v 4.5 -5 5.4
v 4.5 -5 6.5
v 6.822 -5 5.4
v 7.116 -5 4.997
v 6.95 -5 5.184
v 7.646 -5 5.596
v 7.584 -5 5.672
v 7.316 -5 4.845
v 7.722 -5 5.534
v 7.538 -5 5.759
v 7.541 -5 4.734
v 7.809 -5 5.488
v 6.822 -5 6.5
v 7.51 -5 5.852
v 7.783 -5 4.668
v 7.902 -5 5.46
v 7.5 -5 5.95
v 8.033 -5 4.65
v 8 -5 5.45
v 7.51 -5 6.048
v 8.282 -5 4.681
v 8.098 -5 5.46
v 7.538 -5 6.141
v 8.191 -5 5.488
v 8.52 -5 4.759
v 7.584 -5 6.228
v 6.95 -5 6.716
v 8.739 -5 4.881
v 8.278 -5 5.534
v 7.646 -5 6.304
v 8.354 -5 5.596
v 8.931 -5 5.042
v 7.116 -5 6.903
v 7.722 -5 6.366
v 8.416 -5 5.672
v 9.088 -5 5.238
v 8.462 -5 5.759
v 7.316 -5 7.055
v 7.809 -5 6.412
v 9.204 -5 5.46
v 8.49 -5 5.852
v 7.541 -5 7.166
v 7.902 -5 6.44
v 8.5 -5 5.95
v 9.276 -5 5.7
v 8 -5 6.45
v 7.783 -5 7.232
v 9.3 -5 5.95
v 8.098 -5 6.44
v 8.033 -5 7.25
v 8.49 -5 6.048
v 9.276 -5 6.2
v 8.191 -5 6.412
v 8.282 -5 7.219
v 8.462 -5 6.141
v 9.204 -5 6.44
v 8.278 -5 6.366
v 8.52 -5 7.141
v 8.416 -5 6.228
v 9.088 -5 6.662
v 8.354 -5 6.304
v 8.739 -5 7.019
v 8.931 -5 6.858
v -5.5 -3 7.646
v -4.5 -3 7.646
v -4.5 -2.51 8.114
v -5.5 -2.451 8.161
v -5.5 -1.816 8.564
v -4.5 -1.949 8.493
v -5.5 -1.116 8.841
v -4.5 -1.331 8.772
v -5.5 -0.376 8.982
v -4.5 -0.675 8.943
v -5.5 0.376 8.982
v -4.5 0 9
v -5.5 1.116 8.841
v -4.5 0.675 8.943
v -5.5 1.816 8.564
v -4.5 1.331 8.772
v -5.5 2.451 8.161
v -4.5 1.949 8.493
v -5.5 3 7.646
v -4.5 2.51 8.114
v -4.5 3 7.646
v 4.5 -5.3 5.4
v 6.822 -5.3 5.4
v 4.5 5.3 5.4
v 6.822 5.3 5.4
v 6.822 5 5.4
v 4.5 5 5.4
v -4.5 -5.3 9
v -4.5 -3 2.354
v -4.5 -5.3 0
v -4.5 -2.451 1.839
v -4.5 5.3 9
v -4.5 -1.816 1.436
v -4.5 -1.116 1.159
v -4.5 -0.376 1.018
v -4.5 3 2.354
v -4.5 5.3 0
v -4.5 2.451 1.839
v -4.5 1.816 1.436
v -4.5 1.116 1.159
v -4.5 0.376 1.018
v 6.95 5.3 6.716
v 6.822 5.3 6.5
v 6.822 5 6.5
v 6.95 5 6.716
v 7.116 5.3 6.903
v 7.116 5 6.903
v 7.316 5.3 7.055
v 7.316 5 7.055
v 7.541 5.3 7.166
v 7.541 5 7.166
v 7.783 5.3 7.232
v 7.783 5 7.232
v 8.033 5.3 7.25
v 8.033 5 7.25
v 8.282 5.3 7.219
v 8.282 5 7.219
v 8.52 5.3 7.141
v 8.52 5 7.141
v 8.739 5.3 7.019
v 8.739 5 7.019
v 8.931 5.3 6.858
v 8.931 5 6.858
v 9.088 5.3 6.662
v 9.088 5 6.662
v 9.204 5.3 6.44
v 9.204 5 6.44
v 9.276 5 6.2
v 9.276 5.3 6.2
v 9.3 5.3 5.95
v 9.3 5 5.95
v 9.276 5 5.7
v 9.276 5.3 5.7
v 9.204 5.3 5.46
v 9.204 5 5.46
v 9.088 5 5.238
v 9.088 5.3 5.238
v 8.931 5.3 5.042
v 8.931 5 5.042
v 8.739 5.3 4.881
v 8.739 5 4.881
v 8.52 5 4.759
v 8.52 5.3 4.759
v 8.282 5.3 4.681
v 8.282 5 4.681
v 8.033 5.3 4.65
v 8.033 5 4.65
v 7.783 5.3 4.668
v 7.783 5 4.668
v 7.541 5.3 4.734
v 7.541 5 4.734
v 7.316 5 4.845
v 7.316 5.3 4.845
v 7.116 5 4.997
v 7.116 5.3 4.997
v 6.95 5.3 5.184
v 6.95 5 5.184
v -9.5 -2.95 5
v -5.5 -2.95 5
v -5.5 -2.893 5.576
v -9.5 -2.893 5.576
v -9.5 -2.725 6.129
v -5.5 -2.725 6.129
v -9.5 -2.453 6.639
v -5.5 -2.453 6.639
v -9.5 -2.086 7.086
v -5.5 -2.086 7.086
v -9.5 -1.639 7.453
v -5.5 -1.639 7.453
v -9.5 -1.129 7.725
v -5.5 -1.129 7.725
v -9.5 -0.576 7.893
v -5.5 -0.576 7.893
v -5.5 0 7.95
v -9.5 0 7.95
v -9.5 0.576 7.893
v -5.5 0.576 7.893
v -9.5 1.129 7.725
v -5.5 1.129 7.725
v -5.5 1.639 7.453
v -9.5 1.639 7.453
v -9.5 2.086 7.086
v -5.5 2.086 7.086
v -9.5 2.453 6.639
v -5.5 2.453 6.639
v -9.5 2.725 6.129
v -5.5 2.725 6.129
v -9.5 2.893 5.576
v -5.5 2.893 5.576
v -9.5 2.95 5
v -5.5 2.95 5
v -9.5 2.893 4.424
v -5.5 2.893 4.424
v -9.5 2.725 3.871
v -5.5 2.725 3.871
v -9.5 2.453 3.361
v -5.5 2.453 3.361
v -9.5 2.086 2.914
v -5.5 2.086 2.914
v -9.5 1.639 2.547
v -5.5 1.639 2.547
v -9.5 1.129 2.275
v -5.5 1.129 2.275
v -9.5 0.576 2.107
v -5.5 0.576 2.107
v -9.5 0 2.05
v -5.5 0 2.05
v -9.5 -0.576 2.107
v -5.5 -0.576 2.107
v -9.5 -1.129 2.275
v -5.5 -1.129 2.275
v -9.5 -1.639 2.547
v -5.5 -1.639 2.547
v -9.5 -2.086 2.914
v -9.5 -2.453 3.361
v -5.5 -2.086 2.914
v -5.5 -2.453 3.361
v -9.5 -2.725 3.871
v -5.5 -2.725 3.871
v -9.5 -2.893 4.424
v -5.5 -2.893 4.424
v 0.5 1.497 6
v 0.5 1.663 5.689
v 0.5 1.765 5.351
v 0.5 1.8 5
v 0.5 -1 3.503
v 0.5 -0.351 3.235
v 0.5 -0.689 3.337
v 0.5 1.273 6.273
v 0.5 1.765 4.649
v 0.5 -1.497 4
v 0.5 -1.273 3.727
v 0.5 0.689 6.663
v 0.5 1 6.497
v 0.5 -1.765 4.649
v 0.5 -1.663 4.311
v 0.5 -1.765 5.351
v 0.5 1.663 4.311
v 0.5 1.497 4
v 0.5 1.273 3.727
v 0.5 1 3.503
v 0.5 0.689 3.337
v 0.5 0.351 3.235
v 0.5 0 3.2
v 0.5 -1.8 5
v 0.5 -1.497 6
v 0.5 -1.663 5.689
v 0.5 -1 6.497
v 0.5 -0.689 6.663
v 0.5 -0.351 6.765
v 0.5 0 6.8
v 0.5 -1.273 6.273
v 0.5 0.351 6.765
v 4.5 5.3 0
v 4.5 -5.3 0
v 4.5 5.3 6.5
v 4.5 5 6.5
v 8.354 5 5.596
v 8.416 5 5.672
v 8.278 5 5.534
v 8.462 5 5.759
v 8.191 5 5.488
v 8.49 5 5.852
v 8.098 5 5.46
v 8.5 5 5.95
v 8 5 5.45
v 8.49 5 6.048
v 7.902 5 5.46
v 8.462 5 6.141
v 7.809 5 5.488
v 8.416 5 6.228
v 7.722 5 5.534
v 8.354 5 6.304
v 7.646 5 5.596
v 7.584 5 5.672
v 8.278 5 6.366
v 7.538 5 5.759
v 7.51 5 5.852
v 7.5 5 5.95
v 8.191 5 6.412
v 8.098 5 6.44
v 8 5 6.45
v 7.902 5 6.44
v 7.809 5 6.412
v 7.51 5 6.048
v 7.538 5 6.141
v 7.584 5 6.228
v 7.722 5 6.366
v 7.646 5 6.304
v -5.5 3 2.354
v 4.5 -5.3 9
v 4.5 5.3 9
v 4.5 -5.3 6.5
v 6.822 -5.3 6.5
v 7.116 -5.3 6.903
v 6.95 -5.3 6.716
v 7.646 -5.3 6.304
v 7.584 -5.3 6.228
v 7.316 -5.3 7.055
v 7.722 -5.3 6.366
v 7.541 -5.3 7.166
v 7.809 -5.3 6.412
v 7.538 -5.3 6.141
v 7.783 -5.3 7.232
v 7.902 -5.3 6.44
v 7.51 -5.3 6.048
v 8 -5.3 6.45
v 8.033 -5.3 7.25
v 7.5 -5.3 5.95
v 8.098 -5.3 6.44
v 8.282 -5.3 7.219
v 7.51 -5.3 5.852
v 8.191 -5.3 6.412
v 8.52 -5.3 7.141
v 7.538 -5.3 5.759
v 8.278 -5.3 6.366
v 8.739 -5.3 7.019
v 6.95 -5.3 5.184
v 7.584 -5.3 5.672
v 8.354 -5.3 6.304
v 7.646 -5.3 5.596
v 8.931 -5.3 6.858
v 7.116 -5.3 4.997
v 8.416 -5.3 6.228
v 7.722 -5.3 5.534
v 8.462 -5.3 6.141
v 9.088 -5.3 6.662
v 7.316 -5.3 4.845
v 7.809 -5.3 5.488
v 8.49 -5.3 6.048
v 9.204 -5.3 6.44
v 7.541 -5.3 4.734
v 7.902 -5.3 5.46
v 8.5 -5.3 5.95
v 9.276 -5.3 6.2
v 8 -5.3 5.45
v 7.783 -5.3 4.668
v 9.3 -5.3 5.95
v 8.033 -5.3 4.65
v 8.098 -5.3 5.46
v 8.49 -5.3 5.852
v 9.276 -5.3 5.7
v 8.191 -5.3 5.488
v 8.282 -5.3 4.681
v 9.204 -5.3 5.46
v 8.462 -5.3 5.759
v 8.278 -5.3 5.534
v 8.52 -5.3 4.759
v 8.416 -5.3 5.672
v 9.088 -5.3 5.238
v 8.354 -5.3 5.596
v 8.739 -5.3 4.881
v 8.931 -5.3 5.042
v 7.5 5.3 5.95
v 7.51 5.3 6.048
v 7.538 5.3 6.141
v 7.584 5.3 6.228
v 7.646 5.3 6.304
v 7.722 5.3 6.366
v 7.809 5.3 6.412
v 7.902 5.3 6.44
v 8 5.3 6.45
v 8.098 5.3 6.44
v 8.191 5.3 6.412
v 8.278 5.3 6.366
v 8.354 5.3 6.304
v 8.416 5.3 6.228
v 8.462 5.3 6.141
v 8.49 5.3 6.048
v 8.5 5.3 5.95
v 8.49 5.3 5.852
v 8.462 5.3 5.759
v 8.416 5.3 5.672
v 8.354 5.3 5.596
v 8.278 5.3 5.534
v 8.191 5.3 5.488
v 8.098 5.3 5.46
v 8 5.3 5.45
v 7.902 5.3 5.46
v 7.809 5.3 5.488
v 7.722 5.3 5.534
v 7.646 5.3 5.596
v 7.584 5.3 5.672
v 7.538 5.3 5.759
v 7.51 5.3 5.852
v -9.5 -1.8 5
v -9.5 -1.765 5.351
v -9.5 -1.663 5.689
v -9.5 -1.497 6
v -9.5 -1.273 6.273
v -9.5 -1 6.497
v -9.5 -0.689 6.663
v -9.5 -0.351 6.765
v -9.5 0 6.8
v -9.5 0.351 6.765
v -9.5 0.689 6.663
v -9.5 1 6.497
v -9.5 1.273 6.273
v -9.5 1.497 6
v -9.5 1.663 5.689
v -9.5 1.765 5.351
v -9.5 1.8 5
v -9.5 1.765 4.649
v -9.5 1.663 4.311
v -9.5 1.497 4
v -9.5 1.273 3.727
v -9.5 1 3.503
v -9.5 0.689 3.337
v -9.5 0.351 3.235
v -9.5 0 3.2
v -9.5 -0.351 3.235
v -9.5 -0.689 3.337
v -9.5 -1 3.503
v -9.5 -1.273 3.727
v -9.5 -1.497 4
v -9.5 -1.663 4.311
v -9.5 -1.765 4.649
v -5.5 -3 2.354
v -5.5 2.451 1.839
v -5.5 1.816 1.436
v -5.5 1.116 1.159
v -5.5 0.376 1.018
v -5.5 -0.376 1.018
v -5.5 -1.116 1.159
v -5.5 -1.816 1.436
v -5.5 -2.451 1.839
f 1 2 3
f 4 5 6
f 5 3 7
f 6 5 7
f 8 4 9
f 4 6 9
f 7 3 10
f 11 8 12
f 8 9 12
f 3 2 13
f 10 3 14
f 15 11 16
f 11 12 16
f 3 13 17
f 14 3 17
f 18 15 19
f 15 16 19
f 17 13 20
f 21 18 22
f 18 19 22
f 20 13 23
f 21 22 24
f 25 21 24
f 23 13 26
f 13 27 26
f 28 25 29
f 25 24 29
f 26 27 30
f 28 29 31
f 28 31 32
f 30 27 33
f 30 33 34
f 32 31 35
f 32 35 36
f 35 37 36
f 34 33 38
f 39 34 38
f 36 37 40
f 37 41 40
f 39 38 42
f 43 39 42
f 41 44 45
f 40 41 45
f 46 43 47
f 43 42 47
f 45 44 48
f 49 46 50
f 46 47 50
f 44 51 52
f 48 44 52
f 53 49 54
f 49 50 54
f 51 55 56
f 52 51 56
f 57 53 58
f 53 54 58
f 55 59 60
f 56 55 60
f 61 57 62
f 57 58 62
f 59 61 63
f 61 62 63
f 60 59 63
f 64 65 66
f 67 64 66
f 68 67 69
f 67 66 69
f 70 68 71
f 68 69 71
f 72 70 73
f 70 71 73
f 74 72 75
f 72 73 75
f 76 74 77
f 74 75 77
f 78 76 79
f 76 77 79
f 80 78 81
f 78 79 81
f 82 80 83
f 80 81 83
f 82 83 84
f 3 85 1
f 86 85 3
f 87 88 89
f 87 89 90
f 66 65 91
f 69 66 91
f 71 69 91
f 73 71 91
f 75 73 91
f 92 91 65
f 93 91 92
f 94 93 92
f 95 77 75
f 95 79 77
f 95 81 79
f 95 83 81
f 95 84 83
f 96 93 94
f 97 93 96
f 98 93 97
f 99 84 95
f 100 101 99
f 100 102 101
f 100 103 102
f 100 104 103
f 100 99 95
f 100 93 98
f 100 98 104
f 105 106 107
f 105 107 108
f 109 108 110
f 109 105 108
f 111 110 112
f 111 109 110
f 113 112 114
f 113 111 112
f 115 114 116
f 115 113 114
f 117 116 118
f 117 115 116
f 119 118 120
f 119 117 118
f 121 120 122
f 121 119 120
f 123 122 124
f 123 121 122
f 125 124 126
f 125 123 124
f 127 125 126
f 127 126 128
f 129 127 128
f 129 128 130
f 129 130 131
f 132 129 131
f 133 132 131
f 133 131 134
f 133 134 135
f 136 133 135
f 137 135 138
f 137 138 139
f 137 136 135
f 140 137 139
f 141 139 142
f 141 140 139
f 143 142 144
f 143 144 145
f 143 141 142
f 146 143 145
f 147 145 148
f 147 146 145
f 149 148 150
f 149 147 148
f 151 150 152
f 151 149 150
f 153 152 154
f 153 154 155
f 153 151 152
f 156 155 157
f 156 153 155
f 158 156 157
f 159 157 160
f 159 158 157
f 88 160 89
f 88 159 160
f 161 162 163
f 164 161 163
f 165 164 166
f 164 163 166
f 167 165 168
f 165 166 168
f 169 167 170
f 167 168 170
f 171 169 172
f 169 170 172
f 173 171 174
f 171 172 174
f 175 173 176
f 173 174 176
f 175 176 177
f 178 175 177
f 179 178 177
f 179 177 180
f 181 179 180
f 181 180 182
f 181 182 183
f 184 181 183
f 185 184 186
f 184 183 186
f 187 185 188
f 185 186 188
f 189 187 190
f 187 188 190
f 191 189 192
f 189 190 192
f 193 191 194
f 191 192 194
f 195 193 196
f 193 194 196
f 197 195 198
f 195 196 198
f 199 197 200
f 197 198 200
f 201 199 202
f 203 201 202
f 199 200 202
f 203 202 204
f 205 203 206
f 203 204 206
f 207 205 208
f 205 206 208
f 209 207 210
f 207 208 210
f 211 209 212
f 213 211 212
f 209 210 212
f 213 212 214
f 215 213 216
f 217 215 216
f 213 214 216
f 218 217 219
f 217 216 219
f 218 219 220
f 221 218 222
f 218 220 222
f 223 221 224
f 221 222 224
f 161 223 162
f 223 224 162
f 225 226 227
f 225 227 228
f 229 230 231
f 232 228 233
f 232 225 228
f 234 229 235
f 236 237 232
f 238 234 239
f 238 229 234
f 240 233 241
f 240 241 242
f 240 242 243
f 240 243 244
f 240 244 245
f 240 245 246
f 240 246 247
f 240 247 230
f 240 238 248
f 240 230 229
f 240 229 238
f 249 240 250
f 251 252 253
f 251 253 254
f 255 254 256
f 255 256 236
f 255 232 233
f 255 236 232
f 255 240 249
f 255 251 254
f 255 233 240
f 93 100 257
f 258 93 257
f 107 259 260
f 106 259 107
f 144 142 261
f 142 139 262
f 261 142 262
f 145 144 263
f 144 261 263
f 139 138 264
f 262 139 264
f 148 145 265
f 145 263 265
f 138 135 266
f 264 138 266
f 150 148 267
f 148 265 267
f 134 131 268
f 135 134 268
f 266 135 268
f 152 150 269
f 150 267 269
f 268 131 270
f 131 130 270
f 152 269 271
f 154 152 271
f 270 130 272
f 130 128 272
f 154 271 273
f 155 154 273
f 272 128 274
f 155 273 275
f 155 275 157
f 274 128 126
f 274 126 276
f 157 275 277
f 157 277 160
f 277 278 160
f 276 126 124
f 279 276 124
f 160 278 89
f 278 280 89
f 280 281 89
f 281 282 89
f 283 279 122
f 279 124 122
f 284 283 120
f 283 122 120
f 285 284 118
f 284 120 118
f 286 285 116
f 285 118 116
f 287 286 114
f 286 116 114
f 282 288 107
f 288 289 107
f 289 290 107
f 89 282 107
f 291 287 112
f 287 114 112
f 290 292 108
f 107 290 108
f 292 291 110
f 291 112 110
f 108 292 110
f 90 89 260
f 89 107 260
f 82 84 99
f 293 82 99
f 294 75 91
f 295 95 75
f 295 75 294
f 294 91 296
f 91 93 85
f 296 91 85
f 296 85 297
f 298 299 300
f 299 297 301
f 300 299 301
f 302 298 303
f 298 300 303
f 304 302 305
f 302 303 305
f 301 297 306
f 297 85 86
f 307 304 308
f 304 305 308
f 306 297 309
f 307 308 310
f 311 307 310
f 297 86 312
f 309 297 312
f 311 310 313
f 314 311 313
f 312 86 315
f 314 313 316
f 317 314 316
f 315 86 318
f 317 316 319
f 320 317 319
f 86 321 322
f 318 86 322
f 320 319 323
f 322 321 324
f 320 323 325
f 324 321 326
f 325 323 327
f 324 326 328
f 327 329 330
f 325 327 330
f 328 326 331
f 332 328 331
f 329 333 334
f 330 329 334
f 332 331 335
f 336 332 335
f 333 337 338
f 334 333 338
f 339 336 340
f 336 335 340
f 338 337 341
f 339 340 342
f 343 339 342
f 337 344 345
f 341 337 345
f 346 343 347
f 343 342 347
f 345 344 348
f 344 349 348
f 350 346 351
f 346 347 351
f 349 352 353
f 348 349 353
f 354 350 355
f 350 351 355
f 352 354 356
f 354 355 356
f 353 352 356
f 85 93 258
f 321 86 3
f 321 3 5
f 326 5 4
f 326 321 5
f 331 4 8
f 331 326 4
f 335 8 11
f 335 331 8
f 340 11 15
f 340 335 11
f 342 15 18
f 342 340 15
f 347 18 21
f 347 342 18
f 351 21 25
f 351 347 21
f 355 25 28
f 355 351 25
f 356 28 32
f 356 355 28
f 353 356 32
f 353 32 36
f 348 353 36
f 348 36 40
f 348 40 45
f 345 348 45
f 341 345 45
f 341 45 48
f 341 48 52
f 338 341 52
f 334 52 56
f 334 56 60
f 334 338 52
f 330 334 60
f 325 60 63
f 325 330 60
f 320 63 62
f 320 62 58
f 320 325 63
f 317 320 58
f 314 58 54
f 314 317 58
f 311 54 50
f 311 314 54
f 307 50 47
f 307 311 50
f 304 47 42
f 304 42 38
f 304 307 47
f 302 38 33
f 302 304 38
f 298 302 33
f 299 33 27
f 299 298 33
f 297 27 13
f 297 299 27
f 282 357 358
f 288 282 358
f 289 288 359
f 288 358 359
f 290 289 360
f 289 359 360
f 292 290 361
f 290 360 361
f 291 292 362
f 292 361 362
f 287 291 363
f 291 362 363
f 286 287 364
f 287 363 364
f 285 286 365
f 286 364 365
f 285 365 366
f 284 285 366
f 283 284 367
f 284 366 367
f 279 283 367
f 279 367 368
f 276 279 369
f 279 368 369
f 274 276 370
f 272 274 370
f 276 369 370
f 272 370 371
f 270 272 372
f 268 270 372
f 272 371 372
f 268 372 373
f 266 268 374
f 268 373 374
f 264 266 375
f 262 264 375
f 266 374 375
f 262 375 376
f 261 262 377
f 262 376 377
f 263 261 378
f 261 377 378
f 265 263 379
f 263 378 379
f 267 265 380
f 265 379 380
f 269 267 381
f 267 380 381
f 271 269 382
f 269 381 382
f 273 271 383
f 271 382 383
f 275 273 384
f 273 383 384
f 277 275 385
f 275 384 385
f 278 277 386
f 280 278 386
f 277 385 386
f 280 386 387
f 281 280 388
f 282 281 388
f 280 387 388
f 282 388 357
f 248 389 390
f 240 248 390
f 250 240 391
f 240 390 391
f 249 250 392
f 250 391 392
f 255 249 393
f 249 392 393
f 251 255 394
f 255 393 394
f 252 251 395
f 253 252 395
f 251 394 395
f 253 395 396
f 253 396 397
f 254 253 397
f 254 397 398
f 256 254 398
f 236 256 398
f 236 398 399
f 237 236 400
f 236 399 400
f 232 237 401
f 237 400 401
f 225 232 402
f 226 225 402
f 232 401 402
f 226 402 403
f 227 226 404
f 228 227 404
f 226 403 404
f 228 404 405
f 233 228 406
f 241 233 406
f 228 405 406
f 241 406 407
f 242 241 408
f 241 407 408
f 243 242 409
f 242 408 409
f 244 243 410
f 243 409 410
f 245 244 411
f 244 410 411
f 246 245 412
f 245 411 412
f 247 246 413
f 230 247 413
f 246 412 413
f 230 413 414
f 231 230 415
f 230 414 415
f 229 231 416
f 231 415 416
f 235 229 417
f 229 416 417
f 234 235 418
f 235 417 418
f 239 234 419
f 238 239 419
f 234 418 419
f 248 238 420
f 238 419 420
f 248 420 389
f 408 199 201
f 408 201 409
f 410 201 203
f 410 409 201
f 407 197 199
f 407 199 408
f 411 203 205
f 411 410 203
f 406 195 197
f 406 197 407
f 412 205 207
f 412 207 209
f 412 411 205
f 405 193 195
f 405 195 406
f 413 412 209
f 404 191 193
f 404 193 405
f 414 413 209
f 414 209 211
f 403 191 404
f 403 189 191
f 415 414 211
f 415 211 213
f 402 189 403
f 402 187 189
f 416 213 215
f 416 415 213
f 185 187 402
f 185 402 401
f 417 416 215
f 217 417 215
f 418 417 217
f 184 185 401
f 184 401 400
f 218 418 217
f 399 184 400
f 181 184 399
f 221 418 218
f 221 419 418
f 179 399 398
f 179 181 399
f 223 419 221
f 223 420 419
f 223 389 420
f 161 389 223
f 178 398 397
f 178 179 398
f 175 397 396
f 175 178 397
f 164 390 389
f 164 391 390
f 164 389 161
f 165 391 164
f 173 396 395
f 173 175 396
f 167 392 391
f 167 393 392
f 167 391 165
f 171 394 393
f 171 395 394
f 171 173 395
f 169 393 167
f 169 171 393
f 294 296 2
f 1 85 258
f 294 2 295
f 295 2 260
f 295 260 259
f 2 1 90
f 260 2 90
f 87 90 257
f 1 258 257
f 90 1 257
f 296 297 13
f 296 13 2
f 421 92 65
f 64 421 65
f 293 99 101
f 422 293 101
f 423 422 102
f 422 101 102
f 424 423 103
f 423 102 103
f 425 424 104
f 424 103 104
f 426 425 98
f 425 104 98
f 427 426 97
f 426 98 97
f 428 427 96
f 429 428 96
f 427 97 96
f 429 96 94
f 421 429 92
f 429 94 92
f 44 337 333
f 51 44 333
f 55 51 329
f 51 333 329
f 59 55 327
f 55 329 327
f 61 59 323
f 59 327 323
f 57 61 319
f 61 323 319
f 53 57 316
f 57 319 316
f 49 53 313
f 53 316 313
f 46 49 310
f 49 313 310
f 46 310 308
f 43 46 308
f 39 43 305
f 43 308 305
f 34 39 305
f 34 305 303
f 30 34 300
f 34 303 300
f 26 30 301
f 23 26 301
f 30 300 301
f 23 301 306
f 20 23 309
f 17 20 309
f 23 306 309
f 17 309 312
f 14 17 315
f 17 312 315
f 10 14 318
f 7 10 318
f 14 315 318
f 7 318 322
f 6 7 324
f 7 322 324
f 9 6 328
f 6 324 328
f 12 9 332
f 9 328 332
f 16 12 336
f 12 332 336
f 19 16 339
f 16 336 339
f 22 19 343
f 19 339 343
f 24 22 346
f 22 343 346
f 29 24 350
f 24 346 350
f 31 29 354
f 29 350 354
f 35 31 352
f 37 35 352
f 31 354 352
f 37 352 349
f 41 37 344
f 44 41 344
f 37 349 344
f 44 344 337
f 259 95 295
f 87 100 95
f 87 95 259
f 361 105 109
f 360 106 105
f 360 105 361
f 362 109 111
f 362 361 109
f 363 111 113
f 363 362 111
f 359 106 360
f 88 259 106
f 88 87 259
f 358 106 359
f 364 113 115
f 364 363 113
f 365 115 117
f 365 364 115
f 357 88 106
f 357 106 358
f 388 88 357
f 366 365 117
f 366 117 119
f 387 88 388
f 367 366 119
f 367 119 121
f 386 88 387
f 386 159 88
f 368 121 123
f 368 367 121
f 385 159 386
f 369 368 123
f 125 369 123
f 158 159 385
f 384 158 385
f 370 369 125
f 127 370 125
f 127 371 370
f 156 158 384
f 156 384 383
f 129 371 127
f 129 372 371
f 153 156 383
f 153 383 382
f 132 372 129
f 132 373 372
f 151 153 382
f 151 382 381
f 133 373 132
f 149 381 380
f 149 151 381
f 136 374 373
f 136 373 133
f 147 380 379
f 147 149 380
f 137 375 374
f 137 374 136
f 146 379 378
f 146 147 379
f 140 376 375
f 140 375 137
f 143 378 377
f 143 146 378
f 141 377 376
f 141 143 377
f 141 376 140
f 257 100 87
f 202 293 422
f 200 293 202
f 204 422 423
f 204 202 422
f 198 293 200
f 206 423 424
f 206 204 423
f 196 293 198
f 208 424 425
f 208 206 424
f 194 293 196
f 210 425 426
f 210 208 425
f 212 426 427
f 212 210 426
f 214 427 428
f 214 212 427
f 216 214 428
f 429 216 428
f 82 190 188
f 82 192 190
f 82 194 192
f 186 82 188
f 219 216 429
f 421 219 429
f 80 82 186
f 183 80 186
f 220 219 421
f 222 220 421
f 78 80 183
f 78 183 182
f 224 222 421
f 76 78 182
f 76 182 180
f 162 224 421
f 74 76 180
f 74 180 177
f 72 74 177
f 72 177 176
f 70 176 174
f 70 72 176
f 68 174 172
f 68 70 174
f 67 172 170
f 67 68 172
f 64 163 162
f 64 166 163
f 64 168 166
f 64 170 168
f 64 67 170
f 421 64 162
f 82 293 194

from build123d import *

# Parameters (mm, degrees)
F0_W      = 9
F0_H      = 10.6
F1_DEPTH  = 9
F3_DEPTH  = 1
F4_R      = 2.95
F5_DEPTH  = 4
F6_R      = 0.5
F7_DEPTH  = 0.3
F8_R      = 0.5
F9_DEPTH  = 0.3
F10_R     = 1.8
F11_DEPTH = 10


with BuildPart() as f1:
    # F0 (on Top) → F1 (new body)
    with BuildSketch(Plane.XY):
        Rectangle(F0_W, F0_H)
    extrude(amount=F1_DEPTH)

    # F2 (on face) → F3 (join)
    with BuildSketch(Plane(origin=(-4.5, 0, 0), x_dir=(0, -1, 0), z_dir=(-1, 0, 0))):
        with BuildLine():
            Line((3, 2.3542486889), (3, 7.6457513111))
            ThreePointArc((3, 7.6457513111), (0, 9), (-3, 7.6457513111))
            Line((-3, 7.6457513111), (-3, 2.3542486889))
            ThreePointArc((-3, 2.3542486889), (0, 1), (3, 2.3542486889))
        make_face()
    extrude(amount=F3_DEPTH)

    # F4 (on face) → F5 (join)
    with BuildSketch(Plane(origin=(-5.5, 0, 0), x_dir=(0, -1, 0), z_dir=(-1, 0, 0))):
        with Locations((0, 5)):
            Circle(F4_R)
    extrude(amount=F5_DEPTH)

    # F6 (on face) → F7 (join)
    with BuildSketch(Plane(origin=(0, 5.3, 0), x_dir=(-1, 0, 0), z_dir=(0, 1, 0))):
        with BuildLine():
            Line((-4.5, 5.4), (-4.5, 6.5))
            Line((-4.5, 6.5), (-6.8220781011, 6.5))
            ThreePointArc((-6.8220781011, 6.5), (-9.3, 5.95), (-6.8220781011, 5.4))
            Line((-6.8220781011, 5.4), (-4.5, 5.4))
        make_face()
        with Locations((-8, 5.95)):
            Circle(F6_R, mode=Mode.SUBTRACT)
    extrude(amount=-F7_DEPTH)

    # F8 (on face) → F9 (join)
    with BuildSketch(Plane.XZ.offset(5.3)):
        with BuildLine():
            Line((4.5, 6.5), (4.5, 5.4))
            Line((4.5, 5.4), (6.8220781011, 5.4))
            ThreePointArc((6.8220781011, 5.4), (9.3, 5.95), (6.8220781011, 6.5))
            Line((6.8220781011, 6.5), (4.5, 6.5))
        make_face()
        with Locations((8, 5.95)):
            Circle(F8_R, mode=Mode.SUBTRACT)
    extrude(amount=-F9_DEPTH)

    # F10 (on face) → F11 (cut)
    with BuildSketch(Plane(origin=(-9.5, 0, 0), x_dir=(0, -1, 0), z_dir=(-1, 0, 0))):
        with Locations((0, 5)):
            Circle(F10_R)
    extrude(amount=-F11_DEPTH, mode=Mode.SUBTRACT)


solid = f1.part
